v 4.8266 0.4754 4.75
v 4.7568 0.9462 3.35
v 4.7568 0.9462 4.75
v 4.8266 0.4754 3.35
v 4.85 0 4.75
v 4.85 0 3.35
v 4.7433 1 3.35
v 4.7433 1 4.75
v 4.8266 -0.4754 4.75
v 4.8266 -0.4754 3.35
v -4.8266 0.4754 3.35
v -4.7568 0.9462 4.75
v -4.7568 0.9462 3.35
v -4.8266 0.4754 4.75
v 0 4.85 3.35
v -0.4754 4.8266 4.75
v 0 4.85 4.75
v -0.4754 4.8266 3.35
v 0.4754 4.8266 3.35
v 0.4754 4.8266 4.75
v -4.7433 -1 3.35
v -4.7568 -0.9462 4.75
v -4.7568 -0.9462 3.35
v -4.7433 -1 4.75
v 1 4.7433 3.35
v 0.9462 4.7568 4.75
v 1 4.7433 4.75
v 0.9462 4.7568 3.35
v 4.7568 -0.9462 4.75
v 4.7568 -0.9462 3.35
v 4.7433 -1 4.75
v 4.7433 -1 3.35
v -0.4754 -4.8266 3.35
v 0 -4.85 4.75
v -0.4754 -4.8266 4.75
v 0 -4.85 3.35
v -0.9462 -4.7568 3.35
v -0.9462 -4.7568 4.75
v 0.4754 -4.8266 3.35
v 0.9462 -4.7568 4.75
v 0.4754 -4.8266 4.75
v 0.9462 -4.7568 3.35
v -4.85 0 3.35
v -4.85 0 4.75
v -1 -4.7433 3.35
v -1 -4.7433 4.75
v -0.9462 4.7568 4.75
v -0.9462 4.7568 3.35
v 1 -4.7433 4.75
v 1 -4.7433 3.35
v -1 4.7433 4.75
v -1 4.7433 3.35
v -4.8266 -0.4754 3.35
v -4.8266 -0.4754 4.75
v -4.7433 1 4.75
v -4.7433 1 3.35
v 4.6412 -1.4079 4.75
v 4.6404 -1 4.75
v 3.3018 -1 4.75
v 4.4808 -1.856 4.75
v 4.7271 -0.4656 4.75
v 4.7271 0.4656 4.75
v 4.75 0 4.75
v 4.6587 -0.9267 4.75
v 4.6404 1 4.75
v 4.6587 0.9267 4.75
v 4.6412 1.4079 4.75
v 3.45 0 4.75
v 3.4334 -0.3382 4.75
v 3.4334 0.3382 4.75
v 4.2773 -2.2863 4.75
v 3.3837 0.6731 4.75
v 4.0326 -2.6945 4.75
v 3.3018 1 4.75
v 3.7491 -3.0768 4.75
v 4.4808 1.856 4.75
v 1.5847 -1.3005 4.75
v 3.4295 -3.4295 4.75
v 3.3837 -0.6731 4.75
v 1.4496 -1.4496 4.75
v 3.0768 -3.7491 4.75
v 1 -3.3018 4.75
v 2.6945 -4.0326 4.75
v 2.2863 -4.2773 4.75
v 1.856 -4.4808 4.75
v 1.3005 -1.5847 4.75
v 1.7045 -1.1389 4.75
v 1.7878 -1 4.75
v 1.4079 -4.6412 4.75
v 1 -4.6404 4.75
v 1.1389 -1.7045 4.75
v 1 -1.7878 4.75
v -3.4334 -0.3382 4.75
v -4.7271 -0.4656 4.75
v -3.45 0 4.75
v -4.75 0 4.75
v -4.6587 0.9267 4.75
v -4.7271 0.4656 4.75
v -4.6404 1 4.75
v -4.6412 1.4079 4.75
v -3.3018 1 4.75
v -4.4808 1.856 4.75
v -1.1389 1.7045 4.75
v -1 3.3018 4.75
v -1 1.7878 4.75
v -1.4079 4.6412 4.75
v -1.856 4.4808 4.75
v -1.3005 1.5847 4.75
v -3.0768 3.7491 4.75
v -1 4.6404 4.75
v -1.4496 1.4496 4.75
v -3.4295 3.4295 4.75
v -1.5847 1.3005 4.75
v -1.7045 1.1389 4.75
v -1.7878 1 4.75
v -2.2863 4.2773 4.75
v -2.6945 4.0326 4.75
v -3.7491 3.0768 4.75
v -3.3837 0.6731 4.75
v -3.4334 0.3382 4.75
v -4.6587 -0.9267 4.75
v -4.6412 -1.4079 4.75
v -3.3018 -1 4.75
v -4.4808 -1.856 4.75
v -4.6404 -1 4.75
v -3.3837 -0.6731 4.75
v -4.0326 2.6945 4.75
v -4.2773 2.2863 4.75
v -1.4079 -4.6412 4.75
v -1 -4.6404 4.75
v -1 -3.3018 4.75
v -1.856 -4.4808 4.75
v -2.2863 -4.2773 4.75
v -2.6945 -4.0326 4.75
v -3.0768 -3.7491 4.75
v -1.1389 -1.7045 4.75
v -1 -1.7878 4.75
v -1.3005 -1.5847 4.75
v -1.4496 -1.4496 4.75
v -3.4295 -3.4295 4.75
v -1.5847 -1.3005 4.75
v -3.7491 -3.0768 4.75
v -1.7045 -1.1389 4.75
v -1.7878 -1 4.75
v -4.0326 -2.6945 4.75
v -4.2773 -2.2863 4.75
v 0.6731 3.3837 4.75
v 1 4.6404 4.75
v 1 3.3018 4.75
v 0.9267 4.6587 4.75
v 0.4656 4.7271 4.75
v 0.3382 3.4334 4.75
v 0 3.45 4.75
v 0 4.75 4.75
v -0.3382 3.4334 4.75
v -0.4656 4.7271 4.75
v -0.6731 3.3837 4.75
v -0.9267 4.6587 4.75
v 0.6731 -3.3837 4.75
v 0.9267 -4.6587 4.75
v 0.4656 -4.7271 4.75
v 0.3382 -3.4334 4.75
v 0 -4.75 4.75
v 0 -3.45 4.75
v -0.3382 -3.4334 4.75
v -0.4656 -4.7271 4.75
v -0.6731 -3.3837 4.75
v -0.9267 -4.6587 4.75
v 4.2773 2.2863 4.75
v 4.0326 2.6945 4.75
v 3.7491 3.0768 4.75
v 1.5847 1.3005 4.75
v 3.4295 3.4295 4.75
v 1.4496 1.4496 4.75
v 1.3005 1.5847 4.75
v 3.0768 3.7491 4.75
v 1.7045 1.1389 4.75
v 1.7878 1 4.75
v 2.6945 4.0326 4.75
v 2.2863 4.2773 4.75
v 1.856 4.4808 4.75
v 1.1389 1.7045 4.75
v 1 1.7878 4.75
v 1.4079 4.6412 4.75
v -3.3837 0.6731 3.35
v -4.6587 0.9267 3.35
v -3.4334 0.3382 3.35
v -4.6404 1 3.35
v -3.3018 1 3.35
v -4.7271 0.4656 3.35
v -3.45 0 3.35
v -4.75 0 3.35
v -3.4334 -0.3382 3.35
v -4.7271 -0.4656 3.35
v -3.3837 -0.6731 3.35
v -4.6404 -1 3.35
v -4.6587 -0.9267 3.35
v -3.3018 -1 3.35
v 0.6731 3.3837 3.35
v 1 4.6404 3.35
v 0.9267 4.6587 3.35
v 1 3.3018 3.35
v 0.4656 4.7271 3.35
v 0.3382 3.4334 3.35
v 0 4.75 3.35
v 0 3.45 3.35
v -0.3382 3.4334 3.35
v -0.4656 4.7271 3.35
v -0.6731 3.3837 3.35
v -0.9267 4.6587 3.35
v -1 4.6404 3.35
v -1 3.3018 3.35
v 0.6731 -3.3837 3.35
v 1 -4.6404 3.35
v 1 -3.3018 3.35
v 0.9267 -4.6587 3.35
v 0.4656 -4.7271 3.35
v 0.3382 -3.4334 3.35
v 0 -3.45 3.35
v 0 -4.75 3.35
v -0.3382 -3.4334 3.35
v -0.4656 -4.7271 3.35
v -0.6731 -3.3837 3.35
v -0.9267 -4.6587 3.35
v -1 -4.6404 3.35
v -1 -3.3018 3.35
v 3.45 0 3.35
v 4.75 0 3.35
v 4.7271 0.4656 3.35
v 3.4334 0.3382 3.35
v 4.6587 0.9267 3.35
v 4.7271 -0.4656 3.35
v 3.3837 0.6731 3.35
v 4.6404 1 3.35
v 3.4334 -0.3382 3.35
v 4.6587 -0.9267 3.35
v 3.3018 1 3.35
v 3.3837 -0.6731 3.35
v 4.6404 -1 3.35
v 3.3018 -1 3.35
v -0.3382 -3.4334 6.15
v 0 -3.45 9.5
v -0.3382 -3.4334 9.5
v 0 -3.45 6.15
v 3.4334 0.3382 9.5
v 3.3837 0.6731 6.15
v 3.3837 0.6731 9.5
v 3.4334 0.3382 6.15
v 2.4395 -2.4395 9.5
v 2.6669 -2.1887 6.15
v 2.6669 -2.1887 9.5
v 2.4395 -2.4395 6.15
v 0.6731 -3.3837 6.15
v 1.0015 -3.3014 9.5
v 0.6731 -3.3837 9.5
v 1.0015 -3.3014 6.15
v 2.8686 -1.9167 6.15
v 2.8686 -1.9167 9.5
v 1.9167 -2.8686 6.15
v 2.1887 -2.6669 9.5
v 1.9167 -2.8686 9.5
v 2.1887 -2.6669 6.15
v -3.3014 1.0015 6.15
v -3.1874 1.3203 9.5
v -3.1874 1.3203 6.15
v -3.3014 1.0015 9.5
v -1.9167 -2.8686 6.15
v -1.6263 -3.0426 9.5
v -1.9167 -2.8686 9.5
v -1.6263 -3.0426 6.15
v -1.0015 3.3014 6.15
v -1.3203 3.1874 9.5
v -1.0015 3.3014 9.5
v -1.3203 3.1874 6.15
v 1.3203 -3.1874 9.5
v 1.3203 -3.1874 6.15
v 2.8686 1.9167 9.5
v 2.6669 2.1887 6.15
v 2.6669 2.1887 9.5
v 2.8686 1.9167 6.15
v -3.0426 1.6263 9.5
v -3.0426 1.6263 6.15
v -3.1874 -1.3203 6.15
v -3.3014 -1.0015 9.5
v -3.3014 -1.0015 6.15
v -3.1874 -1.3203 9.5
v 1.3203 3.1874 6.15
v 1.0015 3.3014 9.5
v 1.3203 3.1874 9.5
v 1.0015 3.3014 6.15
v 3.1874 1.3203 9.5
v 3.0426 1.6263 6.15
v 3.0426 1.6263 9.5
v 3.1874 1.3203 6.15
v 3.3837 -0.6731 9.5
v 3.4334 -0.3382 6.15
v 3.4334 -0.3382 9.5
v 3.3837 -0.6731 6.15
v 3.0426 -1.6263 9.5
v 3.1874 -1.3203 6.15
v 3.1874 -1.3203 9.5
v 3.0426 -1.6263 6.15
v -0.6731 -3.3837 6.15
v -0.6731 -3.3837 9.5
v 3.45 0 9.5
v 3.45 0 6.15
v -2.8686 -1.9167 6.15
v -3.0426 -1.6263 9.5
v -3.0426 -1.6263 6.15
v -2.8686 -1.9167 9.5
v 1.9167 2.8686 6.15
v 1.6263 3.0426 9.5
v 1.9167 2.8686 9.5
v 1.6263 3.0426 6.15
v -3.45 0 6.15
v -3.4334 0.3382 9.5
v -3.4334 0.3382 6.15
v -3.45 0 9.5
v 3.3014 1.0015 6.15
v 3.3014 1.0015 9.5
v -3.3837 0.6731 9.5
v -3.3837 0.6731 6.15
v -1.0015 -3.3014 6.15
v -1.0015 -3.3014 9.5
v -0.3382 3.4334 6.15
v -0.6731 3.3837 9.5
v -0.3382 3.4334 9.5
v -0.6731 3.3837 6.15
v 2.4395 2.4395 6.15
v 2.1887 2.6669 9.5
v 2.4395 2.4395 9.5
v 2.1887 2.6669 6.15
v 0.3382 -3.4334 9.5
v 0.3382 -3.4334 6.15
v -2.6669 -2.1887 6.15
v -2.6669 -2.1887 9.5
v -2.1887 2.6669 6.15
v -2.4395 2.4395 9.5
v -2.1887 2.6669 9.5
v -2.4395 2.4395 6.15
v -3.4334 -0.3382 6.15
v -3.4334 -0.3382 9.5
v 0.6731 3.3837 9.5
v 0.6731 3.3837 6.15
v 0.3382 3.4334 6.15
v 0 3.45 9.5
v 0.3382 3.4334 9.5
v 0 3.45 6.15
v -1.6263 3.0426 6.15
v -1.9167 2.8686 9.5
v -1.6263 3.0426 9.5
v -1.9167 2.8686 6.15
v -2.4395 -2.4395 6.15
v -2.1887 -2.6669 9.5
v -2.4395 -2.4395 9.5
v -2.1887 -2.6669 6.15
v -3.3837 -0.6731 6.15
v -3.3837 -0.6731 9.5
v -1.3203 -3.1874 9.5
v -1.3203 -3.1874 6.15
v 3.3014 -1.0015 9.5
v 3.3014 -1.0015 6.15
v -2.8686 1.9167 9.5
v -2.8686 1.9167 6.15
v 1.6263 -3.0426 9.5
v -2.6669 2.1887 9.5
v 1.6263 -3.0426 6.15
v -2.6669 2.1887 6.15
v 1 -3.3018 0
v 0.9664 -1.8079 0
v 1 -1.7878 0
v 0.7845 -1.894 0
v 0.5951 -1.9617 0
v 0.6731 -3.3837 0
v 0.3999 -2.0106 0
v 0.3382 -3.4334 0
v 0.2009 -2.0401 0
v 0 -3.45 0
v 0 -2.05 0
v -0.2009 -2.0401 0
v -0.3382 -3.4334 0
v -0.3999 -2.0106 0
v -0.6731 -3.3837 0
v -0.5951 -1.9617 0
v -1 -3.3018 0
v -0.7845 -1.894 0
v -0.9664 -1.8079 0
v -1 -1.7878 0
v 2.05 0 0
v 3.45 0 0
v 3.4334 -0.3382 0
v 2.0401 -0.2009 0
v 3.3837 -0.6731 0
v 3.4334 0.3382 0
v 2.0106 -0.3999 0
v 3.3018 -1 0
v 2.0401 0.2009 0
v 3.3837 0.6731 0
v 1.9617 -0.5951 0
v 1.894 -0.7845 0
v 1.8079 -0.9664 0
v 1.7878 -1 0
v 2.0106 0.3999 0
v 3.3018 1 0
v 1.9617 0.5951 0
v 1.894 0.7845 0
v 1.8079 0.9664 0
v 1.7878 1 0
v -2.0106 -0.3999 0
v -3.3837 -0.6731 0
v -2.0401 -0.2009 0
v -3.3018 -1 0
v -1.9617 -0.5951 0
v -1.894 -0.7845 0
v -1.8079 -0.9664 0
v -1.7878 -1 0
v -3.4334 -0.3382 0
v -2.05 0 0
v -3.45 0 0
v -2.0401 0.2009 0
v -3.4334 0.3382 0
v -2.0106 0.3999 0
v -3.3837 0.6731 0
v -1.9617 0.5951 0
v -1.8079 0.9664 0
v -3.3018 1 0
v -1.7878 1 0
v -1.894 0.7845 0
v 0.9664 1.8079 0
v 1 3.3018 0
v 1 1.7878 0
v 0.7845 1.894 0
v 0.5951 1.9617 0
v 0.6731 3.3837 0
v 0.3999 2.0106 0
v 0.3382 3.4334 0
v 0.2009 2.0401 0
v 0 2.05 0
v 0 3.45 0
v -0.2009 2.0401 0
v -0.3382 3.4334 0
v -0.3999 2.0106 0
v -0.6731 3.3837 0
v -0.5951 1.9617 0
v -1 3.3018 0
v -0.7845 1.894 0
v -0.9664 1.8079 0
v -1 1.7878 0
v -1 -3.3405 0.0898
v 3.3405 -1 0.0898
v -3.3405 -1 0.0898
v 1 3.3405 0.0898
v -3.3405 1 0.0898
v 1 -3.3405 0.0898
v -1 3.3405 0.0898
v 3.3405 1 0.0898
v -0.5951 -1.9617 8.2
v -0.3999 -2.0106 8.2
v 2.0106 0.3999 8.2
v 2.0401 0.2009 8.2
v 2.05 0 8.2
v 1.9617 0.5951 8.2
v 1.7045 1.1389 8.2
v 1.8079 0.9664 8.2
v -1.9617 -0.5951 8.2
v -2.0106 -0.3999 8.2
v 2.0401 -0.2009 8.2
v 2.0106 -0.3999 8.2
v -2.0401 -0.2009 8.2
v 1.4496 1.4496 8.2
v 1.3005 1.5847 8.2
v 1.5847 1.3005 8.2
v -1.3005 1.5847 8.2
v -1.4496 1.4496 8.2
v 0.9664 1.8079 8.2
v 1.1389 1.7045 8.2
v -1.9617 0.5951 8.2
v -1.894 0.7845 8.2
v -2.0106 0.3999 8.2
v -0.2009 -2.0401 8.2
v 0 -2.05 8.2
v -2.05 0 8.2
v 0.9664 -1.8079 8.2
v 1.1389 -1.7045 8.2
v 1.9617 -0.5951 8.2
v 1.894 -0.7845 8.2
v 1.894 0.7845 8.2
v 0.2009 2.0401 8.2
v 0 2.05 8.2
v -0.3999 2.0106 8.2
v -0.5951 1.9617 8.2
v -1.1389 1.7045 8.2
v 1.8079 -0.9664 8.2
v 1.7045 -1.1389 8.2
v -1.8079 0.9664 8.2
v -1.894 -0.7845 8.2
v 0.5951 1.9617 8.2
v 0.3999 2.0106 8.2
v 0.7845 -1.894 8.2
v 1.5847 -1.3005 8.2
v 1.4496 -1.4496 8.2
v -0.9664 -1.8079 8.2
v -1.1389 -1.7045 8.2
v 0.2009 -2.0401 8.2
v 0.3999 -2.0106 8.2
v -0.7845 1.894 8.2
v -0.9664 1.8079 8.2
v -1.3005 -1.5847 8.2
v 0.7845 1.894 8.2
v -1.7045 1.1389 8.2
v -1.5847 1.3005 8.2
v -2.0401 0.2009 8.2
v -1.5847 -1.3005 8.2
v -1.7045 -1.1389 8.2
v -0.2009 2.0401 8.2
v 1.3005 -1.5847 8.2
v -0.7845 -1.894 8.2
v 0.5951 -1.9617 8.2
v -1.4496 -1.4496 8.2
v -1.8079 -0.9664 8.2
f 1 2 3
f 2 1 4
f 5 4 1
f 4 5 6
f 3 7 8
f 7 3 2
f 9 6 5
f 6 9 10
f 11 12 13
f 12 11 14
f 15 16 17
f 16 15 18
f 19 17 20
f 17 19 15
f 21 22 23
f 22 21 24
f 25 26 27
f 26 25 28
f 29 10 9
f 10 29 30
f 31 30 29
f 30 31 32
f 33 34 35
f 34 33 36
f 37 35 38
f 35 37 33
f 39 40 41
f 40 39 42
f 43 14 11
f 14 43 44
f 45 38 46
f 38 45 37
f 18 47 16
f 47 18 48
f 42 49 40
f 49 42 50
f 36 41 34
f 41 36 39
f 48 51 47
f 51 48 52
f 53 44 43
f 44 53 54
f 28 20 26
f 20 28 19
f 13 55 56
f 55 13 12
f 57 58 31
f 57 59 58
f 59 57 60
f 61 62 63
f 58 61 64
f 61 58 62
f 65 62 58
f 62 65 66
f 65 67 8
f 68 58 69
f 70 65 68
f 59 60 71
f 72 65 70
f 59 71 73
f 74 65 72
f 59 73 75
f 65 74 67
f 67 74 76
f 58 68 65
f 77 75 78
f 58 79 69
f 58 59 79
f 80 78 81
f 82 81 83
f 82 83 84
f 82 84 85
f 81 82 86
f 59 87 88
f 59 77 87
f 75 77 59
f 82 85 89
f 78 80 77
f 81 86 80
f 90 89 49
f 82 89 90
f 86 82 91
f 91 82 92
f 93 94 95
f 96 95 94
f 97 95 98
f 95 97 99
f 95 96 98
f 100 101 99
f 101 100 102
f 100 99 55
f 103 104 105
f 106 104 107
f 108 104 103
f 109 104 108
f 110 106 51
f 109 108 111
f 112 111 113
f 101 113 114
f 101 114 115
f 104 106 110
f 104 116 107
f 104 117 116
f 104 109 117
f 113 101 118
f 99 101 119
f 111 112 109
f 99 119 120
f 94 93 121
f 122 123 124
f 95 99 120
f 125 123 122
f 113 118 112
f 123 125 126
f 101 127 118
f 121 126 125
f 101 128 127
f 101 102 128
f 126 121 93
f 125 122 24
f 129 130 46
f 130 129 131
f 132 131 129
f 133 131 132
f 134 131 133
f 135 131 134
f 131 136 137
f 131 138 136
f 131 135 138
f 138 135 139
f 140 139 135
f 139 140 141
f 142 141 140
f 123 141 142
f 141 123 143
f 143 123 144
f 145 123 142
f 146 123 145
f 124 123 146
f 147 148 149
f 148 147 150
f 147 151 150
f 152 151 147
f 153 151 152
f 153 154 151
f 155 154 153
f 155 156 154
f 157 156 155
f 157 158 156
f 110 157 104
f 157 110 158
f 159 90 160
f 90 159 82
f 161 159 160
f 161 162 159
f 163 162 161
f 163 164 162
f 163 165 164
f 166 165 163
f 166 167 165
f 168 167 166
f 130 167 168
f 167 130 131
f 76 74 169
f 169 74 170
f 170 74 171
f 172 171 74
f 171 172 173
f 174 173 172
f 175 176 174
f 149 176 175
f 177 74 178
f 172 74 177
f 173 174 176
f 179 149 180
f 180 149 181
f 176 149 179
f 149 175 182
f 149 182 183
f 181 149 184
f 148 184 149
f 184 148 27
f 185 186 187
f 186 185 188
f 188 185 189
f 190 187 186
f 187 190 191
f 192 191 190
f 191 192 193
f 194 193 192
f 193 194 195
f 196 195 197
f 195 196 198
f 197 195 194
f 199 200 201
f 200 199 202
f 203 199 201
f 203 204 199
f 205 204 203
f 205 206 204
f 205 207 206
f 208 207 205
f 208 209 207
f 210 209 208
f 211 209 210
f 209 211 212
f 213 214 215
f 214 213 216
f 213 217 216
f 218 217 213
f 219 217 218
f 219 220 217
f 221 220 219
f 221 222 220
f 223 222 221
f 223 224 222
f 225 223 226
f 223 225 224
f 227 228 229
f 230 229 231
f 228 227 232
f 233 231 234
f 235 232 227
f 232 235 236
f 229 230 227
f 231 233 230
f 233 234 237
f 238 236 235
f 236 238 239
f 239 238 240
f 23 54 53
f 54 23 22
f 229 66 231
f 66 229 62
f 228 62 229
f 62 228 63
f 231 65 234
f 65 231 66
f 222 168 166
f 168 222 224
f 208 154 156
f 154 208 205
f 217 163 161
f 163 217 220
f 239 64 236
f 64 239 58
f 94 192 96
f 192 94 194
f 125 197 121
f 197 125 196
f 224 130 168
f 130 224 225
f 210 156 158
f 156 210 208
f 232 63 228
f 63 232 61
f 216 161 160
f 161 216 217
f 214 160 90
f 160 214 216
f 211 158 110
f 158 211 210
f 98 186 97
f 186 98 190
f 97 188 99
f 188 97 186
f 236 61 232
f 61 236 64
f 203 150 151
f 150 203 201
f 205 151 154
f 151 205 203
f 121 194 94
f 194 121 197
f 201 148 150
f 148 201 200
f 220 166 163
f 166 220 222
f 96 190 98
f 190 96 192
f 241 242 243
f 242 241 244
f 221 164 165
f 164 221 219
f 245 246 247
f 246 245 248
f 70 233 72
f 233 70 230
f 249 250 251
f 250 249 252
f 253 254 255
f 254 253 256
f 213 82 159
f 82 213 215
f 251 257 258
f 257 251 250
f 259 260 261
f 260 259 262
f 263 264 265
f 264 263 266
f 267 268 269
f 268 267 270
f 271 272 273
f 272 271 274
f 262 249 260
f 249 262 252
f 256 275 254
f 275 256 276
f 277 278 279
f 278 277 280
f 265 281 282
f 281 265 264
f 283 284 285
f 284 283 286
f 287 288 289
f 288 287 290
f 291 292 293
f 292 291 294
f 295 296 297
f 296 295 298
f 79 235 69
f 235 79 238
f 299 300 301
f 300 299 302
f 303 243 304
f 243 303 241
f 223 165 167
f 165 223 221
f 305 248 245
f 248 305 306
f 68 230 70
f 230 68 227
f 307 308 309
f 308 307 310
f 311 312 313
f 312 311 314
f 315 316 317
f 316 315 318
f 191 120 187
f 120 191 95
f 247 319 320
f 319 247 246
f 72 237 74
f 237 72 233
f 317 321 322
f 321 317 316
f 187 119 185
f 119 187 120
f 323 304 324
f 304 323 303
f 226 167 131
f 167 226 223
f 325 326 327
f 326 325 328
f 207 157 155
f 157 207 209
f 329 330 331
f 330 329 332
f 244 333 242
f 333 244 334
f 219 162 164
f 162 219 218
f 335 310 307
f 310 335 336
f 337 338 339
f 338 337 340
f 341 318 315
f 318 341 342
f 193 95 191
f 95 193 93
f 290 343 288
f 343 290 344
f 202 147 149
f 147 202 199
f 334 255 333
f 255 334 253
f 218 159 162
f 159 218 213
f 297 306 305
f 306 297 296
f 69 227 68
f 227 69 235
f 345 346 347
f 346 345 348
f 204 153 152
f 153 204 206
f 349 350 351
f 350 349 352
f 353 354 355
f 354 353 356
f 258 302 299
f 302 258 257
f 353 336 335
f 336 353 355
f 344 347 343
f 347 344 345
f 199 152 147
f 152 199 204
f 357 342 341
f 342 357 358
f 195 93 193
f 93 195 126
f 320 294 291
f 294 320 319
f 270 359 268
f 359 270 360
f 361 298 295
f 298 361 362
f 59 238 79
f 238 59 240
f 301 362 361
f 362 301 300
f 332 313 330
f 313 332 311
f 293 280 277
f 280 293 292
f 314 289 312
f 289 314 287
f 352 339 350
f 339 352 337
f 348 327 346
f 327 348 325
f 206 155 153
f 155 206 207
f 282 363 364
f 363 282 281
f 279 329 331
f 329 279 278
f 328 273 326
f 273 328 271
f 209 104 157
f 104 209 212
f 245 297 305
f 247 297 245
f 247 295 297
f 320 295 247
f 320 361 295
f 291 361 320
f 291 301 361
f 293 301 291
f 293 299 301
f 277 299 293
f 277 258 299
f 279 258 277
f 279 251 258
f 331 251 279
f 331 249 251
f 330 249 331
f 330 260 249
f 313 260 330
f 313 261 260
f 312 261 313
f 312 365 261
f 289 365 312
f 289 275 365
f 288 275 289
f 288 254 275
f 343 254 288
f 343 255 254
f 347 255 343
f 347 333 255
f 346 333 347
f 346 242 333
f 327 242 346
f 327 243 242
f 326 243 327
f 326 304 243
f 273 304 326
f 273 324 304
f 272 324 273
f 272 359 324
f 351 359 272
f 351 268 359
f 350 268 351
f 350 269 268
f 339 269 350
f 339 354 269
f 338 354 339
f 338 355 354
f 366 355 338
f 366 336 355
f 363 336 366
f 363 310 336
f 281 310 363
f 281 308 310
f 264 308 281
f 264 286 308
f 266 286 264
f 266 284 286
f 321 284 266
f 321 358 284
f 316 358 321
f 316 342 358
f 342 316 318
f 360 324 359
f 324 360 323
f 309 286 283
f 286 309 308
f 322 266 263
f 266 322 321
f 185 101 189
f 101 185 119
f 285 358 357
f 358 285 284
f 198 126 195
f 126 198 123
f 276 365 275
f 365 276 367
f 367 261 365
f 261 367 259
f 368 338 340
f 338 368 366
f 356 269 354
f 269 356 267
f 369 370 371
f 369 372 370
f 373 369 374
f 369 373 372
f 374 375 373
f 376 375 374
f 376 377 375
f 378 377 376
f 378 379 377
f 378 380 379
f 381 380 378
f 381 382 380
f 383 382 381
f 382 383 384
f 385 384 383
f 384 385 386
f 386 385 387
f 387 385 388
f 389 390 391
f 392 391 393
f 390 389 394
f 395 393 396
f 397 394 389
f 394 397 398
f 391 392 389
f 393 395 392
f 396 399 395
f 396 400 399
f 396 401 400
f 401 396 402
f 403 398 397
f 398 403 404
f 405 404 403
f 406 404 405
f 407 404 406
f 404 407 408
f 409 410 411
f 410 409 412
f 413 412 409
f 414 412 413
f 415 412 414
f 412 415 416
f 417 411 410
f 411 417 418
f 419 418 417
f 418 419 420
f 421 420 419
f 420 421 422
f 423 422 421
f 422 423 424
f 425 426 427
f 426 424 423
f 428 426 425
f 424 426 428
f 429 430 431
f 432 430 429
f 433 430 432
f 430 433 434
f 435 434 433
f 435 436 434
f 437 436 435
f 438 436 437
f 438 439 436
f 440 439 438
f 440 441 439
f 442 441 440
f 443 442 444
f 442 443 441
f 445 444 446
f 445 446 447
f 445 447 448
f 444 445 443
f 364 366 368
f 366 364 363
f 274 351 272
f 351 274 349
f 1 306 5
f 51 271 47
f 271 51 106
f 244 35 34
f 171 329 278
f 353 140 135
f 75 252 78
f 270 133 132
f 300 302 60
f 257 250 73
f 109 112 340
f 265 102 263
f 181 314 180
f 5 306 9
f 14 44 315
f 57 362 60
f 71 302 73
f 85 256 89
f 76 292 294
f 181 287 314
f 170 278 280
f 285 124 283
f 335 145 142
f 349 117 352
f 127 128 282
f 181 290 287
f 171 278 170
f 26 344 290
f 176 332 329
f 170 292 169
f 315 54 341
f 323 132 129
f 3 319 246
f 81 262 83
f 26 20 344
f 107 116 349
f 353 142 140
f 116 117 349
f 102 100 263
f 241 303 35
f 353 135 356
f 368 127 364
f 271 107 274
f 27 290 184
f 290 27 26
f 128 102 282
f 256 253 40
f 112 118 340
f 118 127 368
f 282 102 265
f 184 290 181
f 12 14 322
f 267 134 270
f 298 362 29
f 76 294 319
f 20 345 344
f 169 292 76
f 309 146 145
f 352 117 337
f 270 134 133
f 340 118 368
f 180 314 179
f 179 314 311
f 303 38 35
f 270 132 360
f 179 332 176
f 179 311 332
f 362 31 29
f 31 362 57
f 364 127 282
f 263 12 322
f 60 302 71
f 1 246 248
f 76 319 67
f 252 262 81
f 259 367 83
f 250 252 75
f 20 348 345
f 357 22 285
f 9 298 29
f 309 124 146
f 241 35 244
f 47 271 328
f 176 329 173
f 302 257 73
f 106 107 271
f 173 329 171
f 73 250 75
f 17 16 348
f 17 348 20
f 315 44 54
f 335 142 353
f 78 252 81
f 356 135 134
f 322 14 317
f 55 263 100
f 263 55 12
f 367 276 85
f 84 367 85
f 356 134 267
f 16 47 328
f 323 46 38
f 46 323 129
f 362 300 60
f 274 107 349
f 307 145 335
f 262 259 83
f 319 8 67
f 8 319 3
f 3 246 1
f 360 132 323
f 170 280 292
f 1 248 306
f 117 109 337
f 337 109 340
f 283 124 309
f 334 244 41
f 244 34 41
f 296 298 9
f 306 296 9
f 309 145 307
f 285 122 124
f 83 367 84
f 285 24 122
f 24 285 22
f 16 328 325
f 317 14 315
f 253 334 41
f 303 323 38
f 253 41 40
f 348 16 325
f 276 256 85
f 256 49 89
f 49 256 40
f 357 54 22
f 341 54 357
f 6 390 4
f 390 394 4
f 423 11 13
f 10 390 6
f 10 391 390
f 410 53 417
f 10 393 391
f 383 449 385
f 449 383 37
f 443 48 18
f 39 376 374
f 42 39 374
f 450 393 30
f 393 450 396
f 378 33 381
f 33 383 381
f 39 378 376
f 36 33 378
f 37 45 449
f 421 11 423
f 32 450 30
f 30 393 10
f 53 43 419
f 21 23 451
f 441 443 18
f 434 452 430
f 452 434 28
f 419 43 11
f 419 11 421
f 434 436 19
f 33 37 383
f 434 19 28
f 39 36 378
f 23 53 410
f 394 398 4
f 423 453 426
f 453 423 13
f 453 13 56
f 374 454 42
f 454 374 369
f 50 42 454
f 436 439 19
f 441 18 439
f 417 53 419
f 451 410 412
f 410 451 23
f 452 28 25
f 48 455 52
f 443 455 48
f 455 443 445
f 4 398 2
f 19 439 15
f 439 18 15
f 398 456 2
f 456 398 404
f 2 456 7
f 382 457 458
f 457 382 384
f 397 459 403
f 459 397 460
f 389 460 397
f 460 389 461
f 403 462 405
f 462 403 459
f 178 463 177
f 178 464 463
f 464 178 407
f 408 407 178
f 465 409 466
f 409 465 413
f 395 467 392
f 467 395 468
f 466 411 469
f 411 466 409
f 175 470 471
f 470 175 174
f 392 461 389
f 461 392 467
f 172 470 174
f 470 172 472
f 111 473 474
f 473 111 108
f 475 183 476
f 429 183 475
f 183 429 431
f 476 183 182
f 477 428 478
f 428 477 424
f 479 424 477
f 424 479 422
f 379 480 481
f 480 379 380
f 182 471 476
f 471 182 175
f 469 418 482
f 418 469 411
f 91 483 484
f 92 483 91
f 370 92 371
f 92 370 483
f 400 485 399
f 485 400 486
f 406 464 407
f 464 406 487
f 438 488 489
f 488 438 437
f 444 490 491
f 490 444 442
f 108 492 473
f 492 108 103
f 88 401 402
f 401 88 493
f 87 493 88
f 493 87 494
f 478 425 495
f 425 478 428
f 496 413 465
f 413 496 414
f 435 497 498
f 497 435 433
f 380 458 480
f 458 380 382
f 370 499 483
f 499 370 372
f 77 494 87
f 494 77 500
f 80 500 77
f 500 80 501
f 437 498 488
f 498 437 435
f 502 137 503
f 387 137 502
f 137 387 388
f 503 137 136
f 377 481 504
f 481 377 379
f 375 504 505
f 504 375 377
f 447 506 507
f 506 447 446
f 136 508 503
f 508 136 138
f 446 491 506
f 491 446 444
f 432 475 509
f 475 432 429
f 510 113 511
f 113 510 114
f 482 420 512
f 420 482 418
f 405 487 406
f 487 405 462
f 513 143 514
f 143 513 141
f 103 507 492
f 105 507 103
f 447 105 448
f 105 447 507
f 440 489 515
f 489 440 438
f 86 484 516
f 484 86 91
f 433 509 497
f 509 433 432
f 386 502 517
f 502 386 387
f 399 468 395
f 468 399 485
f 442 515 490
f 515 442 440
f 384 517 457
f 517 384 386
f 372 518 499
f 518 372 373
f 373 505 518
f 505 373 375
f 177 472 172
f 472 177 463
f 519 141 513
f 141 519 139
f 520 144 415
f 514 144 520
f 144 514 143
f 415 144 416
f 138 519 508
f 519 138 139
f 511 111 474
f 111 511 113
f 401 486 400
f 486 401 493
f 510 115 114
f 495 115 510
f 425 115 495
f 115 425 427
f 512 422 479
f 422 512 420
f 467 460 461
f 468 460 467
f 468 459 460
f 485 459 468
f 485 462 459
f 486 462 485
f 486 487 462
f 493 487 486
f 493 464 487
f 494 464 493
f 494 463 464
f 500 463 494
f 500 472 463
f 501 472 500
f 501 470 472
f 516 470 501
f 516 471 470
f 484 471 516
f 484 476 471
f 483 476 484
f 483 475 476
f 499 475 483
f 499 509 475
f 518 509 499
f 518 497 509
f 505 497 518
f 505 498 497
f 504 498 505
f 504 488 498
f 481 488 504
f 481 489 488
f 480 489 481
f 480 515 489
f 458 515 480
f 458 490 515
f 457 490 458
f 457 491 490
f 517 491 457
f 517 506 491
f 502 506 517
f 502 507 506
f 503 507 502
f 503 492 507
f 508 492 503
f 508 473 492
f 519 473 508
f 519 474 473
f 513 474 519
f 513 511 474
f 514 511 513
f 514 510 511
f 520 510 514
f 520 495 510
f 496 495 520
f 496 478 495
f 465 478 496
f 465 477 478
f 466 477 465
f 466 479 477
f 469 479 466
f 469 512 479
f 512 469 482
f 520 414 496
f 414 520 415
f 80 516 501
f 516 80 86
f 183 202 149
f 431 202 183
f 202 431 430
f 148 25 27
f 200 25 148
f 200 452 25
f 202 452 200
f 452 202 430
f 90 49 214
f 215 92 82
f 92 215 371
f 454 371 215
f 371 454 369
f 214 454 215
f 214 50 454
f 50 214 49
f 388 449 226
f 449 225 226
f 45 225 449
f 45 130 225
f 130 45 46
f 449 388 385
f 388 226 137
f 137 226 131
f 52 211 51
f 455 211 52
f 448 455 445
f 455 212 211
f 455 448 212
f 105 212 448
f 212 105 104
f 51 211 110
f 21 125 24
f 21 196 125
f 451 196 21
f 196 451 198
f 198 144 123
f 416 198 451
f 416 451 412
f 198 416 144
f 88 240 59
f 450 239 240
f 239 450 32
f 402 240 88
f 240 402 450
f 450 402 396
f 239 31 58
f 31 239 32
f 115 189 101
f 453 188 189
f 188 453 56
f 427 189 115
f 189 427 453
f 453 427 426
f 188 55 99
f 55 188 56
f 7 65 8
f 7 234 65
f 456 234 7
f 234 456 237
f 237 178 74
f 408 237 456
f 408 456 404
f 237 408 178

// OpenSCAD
knob_height = 4.75;
knob_od = 7.3;

stiffness = 1.4;
buffer = 0.2;

knob_orad = (knob_od / 2) - buffer;
knob_irad = (knob_od / 2) - stiffness - buffer;
knob_theight = knob_height * 2;
knob_iheight = knob_theight - stiffness + buffer;

$fn = $preview ? 8 : 64;

intersection() {
    knob();
    union() {
        cube_width = 2;
        cube_depth = knob_od + (stiffness * 2);

        translate([0, 0, knob_height]) cylinder(r = knob_orad + stiffness, h = knob_height);
        translate([-cube_width / 2, -cube_depth / 2, 0]) cube([cube_width, cube_depth, knob_height + stiffness]);
        rotate(90, [0, 0, 1]) translate([-cube_width / 2, -cube_depth / 2, 0]) cube([cube_width, cube_depth, knob_height + stiffness]);
    }
}

module knob() {
    difference() {
        union() {
            cylinder(r = knob_orad, h = knob_theight);
            translate([0, 0, knob_height]) cylinder(r1 = knob_orad + stiffness, r2 = knob_orad, h = stiffness);
            translate([0, 0, 0]) cylinder(r1 = knob_orad, r2 = knob_orad + stiffness, h = knob_height - stiffness);

            difference() {
                translate([0, 0, knob_height - stiffness]) cylinder(r = knob_orad + stiffness, h = stiffness);
                translate([0, 0, knob_height - stiffness]) cylinder(r = knob_orad + stiffness - (buffer / 2), h = stiffness);
            }
        }
        translate([0, 0, -(buffer / 2)]) cylinder(r = knob_irad, h = knob_iheight);
    }
}
